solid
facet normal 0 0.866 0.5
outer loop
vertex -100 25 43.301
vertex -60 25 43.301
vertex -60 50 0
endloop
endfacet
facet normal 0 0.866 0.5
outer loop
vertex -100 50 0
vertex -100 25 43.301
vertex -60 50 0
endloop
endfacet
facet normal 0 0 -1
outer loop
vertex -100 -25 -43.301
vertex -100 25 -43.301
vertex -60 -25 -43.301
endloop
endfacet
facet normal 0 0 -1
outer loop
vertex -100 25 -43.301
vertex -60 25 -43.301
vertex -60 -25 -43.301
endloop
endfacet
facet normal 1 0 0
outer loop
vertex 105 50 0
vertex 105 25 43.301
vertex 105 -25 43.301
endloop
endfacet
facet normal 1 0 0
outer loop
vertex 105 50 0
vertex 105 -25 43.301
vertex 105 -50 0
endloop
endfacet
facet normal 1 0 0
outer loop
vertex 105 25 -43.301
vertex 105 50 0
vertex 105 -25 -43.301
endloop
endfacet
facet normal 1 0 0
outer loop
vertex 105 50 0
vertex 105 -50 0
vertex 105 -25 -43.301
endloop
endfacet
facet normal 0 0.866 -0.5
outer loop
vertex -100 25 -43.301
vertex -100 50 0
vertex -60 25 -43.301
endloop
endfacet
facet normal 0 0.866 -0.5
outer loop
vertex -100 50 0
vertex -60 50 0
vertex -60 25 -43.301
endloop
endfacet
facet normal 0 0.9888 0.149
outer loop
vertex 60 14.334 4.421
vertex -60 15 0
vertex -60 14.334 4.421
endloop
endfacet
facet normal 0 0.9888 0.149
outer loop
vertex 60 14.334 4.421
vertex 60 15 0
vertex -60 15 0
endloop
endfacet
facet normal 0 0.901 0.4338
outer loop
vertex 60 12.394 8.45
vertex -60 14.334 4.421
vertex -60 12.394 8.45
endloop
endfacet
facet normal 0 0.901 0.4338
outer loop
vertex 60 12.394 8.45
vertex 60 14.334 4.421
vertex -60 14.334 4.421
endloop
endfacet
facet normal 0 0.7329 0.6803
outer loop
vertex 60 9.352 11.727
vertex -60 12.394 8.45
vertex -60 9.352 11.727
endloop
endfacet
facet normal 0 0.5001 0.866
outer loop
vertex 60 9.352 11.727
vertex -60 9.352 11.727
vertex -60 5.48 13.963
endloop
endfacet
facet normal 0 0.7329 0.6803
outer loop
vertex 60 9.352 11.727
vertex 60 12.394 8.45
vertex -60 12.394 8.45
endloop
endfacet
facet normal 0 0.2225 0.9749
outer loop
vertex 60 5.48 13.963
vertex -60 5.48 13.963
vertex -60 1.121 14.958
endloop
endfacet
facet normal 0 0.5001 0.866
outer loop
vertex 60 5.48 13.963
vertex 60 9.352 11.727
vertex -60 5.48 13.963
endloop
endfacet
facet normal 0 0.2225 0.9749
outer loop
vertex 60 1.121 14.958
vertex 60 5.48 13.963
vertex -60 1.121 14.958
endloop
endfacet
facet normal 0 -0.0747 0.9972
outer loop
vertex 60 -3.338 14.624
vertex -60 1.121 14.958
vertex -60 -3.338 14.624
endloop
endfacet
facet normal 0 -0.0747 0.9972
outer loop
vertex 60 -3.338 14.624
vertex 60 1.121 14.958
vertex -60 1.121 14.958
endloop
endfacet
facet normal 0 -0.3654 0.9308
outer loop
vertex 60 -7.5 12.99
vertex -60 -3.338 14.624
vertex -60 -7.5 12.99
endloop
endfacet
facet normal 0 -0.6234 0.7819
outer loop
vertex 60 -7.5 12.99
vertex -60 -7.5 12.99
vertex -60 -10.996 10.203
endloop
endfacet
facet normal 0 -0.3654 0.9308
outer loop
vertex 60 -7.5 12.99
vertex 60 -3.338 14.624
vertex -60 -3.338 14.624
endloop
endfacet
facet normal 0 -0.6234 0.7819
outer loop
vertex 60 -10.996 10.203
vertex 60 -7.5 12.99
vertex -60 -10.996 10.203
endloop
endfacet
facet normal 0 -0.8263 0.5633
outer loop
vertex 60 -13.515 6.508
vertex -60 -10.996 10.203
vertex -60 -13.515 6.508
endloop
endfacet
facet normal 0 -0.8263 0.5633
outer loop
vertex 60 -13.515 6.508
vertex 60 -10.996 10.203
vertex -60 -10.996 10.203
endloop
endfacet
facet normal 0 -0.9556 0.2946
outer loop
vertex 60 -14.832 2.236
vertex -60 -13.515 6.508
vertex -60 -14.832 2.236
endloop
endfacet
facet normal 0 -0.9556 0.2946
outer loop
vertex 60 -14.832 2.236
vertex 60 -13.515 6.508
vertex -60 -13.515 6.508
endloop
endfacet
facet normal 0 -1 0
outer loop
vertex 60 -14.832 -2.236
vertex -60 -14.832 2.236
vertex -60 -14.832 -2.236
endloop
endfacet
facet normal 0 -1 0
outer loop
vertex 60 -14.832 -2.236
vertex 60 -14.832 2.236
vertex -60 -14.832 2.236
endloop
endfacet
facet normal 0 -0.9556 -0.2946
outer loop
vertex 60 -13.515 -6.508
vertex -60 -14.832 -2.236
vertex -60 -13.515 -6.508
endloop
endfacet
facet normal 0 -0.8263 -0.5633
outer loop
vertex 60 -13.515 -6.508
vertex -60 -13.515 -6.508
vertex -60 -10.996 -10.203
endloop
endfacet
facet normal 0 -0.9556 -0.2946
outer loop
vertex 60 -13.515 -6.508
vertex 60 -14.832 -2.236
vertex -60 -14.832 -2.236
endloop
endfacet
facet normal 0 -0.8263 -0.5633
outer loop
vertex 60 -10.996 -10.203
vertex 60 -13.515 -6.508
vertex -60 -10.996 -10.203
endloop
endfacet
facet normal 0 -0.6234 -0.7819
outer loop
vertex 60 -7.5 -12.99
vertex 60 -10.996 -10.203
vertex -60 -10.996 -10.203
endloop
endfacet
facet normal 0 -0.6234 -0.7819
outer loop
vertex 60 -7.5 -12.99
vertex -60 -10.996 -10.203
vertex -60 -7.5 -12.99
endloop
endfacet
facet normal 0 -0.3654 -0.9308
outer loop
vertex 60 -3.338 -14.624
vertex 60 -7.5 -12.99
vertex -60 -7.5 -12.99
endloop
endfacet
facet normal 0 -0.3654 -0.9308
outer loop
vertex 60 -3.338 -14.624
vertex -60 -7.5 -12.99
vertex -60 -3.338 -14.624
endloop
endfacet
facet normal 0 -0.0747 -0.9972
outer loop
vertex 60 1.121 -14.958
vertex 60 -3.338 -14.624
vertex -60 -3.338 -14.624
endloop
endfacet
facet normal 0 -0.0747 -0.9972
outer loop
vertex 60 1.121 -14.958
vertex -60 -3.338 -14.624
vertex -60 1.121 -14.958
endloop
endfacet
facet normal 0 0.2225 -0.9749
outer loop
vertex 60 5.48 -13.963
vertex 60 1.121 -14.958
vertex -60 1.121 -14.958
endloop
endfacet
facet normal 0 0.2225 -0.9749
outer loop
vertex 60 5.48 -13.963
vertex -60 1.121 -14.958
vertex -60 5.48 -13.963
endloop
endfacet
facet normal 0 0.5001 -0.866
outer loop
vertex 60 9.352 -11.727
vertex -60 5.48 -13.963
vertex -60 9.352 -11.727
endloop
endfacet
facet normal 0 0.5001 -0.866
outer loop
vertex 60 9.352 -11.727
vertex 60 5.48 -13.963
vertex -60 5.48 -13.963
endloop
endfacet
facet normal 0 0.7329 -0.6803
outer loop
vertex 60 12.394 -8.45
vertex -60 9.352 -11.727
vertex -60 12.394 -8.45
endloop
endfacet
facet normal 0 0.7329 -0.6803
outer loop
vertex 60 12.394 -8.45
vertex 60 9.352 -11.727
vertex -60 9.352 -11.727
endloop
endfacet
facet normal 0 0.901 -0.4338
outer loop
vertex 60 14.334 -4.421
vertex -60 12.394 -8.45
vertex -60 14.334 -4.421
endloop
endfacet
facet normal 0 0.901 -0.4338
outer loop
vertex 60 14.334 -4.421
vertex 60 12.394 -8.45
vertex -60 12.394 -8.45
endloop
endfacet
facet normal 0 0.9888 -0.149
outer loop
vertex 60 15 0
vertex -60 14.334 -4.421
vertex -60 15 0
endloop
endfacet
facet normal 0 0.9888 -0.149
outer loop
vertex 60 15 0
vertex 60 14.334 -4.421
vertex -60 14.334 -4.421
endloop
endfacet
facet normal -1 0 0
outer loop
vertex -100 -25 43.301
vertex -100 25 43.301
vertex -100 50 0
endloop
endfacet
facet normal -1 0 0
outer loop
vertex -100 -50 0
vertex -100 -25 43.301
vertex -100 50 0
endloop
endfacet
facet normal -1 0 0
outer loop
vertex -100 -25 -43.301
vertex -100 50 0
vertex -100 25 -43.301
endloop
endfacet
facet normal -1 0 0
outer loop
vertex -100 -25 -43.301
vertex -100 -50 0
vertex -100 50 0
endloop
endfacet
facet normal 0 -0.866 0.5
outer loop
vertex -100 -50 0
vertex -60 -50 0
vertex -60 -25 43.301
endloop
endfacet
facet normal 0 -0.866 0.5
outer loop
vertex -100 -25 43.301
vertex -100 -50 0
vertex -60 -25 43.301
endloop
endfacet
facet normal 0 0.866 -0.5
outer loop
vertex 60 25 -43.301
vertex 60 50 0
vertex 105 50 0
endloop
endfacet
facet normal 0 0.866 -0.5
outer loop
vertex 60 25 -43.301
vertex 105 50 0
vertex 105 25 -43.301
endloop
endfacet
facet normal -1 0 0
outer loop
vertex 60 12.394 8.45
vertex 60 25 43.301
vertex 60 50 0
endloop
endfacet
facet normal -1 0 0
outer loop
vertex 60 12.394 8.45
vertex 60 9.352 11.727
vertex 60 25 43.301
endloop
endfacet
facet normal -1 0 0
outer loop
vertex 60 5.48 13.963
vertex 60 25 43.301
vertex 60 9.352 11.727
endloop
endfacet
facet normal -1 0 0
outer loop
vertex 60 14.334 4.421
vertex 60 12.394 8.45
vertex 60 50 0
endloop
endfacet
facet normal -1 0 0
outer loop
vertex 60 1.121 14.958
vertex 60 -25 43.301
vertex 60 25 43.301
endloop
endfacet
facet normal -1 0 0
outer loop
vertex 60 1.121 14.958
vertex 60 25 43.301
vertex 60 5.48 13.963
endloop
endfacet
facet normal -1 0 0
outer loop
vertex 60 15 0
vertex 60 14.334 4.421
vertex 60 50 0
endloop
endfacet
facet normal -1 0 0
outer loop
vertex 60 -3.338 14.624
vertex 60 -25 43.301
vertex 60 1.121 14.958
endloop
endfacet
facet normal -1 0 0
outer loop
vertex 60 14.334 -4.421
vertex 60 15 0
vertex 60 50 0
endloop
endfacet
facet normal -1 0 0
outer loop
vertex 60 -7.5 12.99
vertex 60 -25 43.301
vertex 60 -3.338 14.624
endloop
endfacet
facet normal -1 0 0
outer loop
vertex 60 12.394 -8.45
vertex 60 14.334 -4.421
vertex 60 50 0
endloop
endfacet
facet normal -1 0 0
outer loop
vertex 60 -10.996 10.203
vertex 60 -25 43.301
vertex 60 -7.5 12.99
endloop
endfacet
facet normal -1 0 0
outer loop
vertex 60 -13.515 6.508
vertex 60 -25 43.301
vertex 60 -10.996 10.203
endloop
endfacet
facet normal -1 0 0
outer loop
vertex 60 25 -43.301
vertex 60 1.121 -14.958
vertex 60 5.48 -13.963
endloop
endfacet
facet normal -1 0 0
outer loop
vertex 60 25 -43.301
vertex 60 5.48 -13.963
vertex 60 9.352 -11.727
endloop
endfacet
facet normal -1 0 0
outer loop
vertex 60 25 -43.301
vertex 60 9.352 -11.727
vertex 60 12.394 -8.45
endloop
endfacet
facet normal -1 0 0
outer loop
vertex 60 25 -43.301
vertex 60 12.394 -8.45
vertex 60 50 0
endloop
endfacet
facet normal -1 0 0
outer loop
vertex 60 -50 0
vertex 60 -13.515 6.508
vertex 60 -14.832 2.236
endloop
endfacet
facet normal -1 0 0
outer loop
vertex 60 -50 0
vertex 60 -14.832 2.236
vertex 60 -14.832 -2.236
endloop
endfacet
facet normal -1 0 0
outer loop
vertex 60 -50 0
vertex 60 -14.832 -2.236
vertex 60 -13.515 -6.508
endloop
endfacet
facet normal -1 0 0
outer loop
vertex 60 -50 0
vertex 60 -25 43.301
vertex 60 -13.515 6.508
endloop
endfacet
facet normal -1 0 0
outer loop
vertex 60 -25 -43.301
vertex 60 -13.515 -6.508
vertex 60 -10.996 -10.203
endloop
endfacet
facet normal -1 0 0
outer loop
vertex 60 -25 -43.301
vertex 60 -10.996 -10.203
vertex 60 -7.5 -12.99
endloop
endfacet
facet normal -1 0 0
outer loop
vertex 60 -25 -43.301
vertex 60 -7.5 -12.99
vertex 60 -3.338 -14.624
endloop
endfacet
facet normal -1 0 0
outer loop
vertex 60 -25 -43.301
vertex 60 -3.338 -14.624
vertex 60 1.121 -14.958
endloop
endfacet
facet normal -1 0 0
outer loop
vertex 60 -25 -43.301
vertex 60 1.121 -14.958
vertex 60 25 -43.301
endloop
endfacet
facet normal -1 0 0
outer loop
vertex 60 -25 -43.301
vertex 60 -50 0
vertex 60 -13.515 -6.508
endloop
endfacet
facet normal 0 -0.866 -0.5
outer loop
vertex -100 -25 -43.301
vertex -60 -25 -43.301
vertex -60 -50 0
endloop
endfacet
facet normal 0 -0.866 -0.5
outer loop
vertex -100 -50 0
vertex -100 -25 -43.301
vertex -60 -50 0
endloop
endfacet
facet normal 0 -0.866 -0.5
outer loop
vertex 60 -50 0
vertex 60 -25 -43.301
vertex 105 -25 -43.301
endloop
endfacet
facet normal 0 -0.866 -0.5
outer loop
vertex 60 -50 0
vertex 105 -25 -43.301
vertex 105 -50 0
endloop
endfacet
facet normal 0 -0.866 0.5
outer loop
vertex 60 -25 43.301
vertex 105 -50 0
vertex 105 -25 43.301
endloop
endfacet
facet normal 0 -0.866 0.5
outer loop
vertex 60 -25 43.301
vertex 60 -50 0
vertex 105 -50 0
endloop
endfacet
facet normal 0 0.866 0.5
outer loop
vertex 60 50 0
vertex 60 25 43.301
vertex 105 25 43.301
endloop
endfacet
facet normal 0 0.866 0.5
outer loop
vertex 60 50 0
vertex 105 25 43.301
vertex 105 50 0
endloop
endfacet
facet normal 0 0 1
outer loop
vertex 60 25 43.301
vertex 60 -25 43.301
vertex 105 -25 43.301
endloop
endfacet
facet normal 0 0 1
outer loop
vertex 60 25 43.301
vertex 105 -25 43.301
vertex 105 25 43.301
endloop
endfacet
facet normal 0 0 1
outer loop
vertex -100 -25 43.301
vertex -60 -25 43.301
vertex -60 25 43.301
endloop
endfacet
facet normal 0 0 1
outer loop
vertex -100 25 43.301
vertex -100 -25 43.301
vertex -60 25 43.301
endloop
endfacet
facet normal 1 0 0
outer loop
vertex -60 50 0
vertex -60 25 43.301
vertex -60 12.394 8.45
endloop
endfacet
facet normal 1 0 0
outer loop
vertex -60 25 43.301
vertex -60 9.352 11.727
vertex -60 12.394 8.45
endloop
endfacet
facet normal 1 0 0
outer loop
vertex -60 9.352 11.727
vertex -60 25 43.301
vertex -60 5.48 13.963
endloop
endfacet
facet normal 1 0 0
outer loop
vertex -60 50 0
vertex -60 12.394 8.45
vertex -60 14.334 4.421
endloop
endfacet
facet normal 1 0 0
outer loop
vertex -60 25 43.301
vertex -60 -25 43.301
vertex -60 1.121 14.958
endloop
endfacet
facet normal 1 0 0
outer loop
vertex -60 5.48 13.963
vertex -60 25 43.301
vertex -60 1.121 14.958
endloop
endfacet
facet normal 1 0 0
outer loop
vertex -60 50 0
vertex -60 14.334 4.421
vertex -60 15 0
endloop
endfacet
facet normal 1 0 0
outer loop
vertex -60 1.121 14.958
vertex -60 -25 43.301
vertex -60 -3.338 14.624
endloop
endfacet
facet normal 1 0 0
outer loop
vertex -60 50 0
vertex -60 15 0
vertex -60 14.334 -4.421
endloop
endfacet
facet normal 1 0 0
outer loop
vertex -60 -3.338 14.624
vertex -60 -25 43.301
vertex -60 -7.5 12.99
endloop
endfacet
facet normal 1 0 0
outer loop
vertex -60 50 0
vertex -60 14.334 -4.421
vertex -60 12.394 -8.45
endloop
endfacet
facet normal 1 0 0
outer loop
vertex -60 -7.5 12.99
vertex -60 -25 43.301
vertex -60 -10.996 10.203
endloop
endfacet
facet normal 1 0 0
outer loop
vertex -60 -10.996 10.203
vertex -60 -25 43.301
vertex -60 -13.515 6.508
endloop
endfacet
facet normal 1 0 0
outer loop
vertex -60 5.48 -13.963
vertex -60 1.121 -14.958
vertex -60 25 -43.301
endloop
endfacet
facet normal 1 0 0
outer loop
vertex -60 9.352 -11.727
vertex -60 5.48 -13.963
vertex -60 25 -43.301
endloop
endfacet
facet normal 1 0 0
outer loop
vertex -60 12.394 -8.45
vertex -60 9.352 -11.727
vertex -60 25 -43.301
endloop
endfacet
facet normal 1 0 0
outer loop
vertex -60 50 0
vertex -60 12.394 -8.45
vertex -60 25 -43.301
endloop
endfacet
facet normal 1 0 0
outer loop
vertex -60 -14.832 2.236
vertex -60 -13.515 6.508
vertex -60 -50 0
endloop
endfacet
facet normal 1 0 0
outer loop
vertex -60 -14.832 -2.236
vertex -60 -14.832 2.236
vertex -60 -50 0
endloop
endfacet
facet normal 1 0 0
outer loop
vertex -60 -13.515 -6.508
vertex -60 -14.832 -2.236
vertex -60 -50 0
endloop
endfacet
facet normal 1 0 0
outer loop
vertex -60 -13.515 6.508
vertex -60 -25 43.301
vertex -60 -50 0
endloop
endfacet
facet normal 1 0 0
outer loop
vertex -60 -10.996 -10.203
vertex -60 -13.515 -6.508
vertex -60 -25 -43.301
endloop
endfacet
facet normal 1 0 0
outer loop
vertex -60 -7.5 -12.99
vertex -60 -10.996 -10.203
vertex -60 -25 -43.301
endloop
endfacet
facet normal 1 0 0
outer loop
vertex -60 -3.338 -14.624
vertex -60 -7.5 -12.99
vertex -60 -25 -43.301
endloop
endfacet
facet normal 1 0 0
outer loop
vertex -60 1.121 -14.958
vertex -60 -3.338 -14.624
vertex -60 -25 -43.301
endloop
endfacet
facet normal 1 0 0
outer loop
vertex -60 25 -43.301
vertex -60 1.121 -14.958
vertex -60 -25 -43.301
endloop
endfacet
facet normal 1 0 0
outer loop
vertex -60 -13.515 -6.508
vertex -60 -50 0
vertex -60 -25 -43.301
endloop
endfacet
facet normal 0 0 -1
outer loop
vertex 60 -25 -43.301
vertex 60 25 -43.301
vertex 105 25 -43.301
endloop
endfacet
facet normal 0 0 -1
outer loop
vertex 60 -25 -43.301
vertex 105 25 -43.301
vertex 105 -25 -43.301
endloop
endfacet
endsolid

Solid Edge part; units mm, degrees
sketch "Sketch1" plane through (0, 0, 0) normal (1, 0, 0) x (0, 1, 0)
  circle A0 centre (0, 0) radius 15
  dimension "D1" = 30
extrude "Protrusion1" add sketch "Sketch1" along normal mid plane 120
sketch "Sketch2" plane through (-60, 0, 0) normal (-1, 0, 0) x (0, -1, 0)
  line L0 (-25, 43.3013) -> (-50, 0)
  line L1 (-50, 0) -> (-25, -43.3013)
  line L2 (-25, -43.3013) -> (25, -43.3013)
  line L3 (25, -43.3013) -> (50, 0)
  line L4 (50, 0) -> (25, 43.3013)
  line L5 (25, 43.3013) -> (-25, 43.3013)
extrude "ExtrudedProtrusion_2" add sketch "Sketch2" along normal blind 40
sketch "Sketch3" plane through (60, 0, 0) normal (1, 0, 0) x (0, -1, 0)
  line L0 (25, -43.3013) -> (-25, -43.3013)
  line L1 (-25, -43.3013) -> (-50, 0)
  line L2 (-50, 0) -> (-25, 43.3013)
  line L3 (-25, 43.3013) -> (25, 43.3013)
  line L4 (25, 43.3013) -> (50, 0)
  line L5 (50, 0) -> (25, -43.3013)
extrude "Protrusion2" add sketch "Sketch3" along normal blind 45
